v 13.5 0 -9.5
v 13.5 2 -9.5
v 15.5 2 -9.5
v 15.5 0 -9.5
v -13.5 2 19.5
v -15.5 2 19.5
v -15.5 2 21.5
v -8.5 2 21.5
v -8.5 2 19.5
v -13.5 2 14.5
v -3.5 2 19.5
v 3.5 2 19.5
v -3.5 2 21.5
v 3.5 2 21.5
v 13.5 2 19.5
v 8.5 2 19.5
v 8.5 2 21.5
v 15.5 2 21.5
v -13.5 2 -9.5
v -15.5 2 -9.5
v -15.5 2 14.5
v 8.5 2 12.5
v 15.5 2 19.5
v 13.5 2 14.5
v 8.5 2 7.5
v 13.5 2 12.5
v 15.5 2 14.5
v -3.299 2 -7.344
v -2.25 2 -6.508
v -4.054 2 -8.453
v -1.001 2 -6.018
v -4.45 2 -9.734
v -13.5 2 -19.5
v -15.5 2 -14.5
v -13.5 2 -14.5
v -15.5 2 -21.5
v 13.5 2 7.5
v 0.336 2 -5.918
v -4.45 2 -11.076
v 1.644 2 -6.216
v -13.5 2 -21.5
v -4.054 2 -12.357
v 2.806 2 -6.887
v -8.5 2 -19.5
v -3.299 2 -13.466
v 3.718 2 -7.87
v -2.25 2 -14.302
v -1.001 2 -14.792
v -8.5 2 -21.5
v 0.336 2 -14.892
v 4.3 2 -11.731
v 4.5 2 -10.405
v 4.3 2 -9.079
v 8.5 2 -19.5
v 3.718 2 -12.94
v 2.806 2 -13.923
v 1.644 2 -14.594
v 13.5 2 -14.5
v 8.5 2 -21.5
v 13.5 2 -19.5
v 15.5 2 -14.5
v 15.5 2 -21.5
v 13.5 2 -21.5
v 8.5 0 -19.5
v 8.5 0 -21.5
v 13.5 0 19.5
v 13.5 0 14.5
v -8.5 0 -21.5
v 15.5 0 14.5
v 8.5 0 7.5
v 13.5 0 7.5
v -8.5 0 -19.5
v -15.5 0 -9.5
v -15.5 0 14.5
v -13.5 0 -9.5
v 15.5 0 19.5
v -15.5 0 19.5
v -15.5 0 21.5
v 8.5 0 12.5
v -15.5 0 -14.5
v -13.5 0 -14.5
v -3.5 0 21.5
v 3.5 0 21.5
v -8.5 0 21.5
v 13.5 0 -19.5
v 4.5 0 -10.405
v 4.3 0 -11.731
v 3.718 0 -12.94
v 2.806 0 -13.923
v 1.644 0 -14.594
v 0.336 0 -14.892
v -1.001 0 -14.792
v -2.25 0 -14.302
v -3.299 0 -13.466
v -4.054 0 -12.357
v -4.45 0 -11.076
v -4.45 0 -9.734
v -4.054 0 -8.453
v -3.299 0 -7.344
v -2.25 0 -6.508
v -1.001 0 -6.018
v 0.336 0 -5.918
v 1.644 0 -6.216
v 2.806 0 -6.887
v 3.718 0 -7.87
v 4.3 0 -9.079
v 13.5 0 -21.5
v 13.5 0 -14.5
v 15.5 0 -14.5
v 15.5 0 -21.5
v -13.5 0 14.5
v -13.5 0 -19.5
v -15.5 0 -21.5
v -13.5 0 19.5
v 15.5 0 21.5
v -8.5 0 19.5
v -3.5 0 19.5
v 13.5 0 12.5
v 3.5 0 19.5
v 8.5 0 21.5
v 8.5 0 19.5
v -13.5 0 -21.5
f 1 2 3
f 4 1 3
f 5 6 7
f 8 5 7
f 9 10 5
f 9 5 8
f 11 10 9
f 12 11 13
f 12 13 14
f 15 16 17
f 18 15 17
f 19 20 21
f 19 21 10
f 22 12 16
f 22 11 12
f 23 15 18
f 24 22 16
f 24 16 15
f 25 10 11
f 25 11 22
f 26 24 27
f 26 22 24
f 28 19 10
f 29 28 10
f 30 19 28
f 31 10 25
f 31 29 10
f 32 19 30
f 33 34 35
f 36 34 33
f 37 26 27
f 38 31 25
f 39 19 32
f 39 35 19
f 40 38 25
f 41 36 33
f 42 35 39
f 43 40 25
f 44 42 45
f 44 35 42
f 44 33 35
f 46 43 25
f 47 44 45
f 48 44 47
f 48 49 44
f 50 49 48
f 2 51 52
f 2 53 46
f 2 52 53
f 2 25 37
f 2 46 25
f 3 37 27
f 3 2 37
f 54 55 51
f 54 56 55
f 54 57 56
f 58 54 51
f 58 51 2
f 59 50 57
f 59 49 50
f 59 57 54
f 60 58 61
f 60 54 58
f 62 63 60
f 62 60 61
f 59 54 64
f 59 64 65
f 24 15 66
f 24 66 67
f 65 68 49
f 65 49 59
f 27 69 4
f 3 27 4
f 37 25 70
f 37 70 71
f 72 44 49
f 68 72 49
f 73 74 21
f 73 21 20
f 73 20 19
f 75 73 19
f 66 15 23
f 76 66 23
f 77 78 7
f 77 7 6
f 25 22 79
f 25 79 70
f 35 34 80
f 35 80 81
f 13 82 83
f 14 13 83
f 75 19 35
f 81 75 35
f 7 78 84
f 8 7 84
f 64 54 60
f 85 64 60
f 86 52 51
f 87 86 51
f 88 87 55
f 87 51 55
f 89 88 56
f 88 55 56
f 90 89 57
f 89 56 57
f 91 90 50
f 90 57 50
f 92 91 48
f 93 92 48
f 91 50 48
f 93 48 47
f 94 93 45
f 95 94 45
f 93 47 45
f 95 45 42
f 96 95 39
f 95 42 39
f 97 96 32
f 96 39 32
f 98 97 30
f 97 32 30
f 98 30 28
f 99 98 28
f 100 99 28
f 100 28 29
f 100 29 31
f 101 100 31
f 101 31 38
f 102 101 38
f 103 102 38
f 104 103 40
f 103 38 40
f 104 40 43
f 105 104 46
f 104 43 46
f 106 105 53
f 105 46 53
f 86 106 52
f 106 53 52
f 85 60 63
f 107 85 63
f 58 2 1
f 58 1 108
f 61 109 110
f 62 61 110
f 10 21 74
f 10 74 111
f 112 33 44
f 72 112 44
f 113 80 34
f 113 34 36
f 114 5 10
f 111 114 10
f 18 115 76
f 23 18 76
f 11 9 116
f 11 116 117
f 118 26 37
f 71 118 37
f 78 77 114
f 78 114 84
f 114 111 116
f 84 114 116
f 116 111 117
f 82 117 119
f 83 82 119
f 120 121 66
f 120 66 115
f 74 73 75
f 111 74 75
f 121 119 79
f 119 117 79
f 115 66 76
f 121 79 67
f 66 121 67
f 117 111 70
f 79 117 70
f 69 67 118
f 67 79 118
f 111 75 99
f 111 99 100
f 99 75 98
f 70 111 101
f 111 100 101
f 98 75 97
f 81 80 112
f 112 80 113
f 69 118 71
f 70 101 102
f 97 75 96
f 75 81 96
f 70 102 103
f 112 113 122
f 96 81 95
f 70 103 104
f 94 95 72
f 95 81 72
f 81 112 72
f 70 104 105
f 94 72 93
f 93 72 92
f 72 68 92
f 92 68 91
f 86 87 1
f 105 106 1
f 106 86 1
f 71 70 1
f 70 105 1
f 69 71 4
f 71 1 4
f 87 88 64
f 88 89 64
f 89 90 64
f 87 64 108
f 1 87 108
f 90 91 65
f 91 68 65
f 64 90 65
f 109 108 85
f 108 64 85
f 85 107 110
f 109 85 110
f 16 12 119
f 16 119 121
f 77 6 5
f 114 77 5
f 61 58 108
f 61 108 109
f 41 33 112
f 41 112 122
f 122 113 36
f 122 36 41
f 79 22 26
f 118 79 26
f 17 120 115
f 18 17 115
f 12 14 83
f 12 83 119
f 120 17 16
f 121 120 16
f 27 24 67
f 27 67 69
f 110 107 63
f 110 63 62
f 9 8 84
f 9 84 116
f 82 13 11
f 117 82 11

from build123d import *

# Parameters (mm, degrees)
SKETCH1_W           = 31
SKETCH1_H           = 43
BOSS_EXTRUDE1_DEPTH = 2
SKETCH2_W           = 5
SKETCH2_H           = 2
CUT_EXTRUDE1_DEPTH  = 2
SKETCH3_R           = 4.5
SKETCH3_W           = 5
SKETCH3_H           = 5
SKETCH3_W_2         = 2
SKETCH3_H_2         = 2
CUT_EXTRUDE2_DEPTH  = 2


with BuildPart() as part:
    # Sketch1 → Boss-Extrude1 (new body)
    with BuildSketch(Plane(origin=(0, 0, 0), x_dir=(1, 0, 0), z_dir=(0, 1, 0))):
        Rectangle(SKETCH1_W, SKETCH1_H)
    extrude(amount=BOSS_EXTRUDE1_DEPTH)

    # Sketch2 → Cut-Extrude1 (cut)
    with BuildSketch(Plane(origin=(0, 2, 0), x_dir=(1, 0, 0), z_dir=(0, 1, 0))):
        with Locations((11, 20.5)):
            Rectangle(SKETCH2_W, SKETCH2_H)
        with Locations((-11, 20.5)):
            Rectangle(SKETCH2_W, SKETCH2_H)
    extrude(amount=-CUT_EXTRUDE1_DEPTH, mode=Mode.SUBTRACT)

    # Sketch3 → Cut-Extrude2 (cut)
    with BuildSketch(Plane(origin=(0, 2, 0), x_dir=(1, 0, 0), z_dir=(0, 1, 0))):
        with Locations((0, 10.405013978)):
            Circle(SKETCH3_R)
        with Locations((11, -10)):
            Rectangle(SKETCH3_W, SKETCH3_H)
        with Locations((14.5, -17)):
            Rectangle(SKETCH3_W_2, SKETCH3_H)
        with Locations((6, -20.5)):
            Rectangle(SKETCH3_W, SKETCH3_H_2)
        with Locations((-14.5, -17)):
            Rectangle(SKETCH3_W_2, SKETCH3_H)
        with Locations((-6, -20.5)):
            Rectangle(SKETCH3_W, SKETCH3_H_2)
        with Locations((14.5, 12)):
            Rectangle(SKETCH3_W_2, SKETCH3_H)
        with Locations((-14.5, 12)):
            Rectangle(SKETCH3_W_2, SKETCH3_H)
    extrude(amount=-CUT_EXTRUDE2_DEPTH, mode=Mode.SUBTRACT)


solid = part.part
